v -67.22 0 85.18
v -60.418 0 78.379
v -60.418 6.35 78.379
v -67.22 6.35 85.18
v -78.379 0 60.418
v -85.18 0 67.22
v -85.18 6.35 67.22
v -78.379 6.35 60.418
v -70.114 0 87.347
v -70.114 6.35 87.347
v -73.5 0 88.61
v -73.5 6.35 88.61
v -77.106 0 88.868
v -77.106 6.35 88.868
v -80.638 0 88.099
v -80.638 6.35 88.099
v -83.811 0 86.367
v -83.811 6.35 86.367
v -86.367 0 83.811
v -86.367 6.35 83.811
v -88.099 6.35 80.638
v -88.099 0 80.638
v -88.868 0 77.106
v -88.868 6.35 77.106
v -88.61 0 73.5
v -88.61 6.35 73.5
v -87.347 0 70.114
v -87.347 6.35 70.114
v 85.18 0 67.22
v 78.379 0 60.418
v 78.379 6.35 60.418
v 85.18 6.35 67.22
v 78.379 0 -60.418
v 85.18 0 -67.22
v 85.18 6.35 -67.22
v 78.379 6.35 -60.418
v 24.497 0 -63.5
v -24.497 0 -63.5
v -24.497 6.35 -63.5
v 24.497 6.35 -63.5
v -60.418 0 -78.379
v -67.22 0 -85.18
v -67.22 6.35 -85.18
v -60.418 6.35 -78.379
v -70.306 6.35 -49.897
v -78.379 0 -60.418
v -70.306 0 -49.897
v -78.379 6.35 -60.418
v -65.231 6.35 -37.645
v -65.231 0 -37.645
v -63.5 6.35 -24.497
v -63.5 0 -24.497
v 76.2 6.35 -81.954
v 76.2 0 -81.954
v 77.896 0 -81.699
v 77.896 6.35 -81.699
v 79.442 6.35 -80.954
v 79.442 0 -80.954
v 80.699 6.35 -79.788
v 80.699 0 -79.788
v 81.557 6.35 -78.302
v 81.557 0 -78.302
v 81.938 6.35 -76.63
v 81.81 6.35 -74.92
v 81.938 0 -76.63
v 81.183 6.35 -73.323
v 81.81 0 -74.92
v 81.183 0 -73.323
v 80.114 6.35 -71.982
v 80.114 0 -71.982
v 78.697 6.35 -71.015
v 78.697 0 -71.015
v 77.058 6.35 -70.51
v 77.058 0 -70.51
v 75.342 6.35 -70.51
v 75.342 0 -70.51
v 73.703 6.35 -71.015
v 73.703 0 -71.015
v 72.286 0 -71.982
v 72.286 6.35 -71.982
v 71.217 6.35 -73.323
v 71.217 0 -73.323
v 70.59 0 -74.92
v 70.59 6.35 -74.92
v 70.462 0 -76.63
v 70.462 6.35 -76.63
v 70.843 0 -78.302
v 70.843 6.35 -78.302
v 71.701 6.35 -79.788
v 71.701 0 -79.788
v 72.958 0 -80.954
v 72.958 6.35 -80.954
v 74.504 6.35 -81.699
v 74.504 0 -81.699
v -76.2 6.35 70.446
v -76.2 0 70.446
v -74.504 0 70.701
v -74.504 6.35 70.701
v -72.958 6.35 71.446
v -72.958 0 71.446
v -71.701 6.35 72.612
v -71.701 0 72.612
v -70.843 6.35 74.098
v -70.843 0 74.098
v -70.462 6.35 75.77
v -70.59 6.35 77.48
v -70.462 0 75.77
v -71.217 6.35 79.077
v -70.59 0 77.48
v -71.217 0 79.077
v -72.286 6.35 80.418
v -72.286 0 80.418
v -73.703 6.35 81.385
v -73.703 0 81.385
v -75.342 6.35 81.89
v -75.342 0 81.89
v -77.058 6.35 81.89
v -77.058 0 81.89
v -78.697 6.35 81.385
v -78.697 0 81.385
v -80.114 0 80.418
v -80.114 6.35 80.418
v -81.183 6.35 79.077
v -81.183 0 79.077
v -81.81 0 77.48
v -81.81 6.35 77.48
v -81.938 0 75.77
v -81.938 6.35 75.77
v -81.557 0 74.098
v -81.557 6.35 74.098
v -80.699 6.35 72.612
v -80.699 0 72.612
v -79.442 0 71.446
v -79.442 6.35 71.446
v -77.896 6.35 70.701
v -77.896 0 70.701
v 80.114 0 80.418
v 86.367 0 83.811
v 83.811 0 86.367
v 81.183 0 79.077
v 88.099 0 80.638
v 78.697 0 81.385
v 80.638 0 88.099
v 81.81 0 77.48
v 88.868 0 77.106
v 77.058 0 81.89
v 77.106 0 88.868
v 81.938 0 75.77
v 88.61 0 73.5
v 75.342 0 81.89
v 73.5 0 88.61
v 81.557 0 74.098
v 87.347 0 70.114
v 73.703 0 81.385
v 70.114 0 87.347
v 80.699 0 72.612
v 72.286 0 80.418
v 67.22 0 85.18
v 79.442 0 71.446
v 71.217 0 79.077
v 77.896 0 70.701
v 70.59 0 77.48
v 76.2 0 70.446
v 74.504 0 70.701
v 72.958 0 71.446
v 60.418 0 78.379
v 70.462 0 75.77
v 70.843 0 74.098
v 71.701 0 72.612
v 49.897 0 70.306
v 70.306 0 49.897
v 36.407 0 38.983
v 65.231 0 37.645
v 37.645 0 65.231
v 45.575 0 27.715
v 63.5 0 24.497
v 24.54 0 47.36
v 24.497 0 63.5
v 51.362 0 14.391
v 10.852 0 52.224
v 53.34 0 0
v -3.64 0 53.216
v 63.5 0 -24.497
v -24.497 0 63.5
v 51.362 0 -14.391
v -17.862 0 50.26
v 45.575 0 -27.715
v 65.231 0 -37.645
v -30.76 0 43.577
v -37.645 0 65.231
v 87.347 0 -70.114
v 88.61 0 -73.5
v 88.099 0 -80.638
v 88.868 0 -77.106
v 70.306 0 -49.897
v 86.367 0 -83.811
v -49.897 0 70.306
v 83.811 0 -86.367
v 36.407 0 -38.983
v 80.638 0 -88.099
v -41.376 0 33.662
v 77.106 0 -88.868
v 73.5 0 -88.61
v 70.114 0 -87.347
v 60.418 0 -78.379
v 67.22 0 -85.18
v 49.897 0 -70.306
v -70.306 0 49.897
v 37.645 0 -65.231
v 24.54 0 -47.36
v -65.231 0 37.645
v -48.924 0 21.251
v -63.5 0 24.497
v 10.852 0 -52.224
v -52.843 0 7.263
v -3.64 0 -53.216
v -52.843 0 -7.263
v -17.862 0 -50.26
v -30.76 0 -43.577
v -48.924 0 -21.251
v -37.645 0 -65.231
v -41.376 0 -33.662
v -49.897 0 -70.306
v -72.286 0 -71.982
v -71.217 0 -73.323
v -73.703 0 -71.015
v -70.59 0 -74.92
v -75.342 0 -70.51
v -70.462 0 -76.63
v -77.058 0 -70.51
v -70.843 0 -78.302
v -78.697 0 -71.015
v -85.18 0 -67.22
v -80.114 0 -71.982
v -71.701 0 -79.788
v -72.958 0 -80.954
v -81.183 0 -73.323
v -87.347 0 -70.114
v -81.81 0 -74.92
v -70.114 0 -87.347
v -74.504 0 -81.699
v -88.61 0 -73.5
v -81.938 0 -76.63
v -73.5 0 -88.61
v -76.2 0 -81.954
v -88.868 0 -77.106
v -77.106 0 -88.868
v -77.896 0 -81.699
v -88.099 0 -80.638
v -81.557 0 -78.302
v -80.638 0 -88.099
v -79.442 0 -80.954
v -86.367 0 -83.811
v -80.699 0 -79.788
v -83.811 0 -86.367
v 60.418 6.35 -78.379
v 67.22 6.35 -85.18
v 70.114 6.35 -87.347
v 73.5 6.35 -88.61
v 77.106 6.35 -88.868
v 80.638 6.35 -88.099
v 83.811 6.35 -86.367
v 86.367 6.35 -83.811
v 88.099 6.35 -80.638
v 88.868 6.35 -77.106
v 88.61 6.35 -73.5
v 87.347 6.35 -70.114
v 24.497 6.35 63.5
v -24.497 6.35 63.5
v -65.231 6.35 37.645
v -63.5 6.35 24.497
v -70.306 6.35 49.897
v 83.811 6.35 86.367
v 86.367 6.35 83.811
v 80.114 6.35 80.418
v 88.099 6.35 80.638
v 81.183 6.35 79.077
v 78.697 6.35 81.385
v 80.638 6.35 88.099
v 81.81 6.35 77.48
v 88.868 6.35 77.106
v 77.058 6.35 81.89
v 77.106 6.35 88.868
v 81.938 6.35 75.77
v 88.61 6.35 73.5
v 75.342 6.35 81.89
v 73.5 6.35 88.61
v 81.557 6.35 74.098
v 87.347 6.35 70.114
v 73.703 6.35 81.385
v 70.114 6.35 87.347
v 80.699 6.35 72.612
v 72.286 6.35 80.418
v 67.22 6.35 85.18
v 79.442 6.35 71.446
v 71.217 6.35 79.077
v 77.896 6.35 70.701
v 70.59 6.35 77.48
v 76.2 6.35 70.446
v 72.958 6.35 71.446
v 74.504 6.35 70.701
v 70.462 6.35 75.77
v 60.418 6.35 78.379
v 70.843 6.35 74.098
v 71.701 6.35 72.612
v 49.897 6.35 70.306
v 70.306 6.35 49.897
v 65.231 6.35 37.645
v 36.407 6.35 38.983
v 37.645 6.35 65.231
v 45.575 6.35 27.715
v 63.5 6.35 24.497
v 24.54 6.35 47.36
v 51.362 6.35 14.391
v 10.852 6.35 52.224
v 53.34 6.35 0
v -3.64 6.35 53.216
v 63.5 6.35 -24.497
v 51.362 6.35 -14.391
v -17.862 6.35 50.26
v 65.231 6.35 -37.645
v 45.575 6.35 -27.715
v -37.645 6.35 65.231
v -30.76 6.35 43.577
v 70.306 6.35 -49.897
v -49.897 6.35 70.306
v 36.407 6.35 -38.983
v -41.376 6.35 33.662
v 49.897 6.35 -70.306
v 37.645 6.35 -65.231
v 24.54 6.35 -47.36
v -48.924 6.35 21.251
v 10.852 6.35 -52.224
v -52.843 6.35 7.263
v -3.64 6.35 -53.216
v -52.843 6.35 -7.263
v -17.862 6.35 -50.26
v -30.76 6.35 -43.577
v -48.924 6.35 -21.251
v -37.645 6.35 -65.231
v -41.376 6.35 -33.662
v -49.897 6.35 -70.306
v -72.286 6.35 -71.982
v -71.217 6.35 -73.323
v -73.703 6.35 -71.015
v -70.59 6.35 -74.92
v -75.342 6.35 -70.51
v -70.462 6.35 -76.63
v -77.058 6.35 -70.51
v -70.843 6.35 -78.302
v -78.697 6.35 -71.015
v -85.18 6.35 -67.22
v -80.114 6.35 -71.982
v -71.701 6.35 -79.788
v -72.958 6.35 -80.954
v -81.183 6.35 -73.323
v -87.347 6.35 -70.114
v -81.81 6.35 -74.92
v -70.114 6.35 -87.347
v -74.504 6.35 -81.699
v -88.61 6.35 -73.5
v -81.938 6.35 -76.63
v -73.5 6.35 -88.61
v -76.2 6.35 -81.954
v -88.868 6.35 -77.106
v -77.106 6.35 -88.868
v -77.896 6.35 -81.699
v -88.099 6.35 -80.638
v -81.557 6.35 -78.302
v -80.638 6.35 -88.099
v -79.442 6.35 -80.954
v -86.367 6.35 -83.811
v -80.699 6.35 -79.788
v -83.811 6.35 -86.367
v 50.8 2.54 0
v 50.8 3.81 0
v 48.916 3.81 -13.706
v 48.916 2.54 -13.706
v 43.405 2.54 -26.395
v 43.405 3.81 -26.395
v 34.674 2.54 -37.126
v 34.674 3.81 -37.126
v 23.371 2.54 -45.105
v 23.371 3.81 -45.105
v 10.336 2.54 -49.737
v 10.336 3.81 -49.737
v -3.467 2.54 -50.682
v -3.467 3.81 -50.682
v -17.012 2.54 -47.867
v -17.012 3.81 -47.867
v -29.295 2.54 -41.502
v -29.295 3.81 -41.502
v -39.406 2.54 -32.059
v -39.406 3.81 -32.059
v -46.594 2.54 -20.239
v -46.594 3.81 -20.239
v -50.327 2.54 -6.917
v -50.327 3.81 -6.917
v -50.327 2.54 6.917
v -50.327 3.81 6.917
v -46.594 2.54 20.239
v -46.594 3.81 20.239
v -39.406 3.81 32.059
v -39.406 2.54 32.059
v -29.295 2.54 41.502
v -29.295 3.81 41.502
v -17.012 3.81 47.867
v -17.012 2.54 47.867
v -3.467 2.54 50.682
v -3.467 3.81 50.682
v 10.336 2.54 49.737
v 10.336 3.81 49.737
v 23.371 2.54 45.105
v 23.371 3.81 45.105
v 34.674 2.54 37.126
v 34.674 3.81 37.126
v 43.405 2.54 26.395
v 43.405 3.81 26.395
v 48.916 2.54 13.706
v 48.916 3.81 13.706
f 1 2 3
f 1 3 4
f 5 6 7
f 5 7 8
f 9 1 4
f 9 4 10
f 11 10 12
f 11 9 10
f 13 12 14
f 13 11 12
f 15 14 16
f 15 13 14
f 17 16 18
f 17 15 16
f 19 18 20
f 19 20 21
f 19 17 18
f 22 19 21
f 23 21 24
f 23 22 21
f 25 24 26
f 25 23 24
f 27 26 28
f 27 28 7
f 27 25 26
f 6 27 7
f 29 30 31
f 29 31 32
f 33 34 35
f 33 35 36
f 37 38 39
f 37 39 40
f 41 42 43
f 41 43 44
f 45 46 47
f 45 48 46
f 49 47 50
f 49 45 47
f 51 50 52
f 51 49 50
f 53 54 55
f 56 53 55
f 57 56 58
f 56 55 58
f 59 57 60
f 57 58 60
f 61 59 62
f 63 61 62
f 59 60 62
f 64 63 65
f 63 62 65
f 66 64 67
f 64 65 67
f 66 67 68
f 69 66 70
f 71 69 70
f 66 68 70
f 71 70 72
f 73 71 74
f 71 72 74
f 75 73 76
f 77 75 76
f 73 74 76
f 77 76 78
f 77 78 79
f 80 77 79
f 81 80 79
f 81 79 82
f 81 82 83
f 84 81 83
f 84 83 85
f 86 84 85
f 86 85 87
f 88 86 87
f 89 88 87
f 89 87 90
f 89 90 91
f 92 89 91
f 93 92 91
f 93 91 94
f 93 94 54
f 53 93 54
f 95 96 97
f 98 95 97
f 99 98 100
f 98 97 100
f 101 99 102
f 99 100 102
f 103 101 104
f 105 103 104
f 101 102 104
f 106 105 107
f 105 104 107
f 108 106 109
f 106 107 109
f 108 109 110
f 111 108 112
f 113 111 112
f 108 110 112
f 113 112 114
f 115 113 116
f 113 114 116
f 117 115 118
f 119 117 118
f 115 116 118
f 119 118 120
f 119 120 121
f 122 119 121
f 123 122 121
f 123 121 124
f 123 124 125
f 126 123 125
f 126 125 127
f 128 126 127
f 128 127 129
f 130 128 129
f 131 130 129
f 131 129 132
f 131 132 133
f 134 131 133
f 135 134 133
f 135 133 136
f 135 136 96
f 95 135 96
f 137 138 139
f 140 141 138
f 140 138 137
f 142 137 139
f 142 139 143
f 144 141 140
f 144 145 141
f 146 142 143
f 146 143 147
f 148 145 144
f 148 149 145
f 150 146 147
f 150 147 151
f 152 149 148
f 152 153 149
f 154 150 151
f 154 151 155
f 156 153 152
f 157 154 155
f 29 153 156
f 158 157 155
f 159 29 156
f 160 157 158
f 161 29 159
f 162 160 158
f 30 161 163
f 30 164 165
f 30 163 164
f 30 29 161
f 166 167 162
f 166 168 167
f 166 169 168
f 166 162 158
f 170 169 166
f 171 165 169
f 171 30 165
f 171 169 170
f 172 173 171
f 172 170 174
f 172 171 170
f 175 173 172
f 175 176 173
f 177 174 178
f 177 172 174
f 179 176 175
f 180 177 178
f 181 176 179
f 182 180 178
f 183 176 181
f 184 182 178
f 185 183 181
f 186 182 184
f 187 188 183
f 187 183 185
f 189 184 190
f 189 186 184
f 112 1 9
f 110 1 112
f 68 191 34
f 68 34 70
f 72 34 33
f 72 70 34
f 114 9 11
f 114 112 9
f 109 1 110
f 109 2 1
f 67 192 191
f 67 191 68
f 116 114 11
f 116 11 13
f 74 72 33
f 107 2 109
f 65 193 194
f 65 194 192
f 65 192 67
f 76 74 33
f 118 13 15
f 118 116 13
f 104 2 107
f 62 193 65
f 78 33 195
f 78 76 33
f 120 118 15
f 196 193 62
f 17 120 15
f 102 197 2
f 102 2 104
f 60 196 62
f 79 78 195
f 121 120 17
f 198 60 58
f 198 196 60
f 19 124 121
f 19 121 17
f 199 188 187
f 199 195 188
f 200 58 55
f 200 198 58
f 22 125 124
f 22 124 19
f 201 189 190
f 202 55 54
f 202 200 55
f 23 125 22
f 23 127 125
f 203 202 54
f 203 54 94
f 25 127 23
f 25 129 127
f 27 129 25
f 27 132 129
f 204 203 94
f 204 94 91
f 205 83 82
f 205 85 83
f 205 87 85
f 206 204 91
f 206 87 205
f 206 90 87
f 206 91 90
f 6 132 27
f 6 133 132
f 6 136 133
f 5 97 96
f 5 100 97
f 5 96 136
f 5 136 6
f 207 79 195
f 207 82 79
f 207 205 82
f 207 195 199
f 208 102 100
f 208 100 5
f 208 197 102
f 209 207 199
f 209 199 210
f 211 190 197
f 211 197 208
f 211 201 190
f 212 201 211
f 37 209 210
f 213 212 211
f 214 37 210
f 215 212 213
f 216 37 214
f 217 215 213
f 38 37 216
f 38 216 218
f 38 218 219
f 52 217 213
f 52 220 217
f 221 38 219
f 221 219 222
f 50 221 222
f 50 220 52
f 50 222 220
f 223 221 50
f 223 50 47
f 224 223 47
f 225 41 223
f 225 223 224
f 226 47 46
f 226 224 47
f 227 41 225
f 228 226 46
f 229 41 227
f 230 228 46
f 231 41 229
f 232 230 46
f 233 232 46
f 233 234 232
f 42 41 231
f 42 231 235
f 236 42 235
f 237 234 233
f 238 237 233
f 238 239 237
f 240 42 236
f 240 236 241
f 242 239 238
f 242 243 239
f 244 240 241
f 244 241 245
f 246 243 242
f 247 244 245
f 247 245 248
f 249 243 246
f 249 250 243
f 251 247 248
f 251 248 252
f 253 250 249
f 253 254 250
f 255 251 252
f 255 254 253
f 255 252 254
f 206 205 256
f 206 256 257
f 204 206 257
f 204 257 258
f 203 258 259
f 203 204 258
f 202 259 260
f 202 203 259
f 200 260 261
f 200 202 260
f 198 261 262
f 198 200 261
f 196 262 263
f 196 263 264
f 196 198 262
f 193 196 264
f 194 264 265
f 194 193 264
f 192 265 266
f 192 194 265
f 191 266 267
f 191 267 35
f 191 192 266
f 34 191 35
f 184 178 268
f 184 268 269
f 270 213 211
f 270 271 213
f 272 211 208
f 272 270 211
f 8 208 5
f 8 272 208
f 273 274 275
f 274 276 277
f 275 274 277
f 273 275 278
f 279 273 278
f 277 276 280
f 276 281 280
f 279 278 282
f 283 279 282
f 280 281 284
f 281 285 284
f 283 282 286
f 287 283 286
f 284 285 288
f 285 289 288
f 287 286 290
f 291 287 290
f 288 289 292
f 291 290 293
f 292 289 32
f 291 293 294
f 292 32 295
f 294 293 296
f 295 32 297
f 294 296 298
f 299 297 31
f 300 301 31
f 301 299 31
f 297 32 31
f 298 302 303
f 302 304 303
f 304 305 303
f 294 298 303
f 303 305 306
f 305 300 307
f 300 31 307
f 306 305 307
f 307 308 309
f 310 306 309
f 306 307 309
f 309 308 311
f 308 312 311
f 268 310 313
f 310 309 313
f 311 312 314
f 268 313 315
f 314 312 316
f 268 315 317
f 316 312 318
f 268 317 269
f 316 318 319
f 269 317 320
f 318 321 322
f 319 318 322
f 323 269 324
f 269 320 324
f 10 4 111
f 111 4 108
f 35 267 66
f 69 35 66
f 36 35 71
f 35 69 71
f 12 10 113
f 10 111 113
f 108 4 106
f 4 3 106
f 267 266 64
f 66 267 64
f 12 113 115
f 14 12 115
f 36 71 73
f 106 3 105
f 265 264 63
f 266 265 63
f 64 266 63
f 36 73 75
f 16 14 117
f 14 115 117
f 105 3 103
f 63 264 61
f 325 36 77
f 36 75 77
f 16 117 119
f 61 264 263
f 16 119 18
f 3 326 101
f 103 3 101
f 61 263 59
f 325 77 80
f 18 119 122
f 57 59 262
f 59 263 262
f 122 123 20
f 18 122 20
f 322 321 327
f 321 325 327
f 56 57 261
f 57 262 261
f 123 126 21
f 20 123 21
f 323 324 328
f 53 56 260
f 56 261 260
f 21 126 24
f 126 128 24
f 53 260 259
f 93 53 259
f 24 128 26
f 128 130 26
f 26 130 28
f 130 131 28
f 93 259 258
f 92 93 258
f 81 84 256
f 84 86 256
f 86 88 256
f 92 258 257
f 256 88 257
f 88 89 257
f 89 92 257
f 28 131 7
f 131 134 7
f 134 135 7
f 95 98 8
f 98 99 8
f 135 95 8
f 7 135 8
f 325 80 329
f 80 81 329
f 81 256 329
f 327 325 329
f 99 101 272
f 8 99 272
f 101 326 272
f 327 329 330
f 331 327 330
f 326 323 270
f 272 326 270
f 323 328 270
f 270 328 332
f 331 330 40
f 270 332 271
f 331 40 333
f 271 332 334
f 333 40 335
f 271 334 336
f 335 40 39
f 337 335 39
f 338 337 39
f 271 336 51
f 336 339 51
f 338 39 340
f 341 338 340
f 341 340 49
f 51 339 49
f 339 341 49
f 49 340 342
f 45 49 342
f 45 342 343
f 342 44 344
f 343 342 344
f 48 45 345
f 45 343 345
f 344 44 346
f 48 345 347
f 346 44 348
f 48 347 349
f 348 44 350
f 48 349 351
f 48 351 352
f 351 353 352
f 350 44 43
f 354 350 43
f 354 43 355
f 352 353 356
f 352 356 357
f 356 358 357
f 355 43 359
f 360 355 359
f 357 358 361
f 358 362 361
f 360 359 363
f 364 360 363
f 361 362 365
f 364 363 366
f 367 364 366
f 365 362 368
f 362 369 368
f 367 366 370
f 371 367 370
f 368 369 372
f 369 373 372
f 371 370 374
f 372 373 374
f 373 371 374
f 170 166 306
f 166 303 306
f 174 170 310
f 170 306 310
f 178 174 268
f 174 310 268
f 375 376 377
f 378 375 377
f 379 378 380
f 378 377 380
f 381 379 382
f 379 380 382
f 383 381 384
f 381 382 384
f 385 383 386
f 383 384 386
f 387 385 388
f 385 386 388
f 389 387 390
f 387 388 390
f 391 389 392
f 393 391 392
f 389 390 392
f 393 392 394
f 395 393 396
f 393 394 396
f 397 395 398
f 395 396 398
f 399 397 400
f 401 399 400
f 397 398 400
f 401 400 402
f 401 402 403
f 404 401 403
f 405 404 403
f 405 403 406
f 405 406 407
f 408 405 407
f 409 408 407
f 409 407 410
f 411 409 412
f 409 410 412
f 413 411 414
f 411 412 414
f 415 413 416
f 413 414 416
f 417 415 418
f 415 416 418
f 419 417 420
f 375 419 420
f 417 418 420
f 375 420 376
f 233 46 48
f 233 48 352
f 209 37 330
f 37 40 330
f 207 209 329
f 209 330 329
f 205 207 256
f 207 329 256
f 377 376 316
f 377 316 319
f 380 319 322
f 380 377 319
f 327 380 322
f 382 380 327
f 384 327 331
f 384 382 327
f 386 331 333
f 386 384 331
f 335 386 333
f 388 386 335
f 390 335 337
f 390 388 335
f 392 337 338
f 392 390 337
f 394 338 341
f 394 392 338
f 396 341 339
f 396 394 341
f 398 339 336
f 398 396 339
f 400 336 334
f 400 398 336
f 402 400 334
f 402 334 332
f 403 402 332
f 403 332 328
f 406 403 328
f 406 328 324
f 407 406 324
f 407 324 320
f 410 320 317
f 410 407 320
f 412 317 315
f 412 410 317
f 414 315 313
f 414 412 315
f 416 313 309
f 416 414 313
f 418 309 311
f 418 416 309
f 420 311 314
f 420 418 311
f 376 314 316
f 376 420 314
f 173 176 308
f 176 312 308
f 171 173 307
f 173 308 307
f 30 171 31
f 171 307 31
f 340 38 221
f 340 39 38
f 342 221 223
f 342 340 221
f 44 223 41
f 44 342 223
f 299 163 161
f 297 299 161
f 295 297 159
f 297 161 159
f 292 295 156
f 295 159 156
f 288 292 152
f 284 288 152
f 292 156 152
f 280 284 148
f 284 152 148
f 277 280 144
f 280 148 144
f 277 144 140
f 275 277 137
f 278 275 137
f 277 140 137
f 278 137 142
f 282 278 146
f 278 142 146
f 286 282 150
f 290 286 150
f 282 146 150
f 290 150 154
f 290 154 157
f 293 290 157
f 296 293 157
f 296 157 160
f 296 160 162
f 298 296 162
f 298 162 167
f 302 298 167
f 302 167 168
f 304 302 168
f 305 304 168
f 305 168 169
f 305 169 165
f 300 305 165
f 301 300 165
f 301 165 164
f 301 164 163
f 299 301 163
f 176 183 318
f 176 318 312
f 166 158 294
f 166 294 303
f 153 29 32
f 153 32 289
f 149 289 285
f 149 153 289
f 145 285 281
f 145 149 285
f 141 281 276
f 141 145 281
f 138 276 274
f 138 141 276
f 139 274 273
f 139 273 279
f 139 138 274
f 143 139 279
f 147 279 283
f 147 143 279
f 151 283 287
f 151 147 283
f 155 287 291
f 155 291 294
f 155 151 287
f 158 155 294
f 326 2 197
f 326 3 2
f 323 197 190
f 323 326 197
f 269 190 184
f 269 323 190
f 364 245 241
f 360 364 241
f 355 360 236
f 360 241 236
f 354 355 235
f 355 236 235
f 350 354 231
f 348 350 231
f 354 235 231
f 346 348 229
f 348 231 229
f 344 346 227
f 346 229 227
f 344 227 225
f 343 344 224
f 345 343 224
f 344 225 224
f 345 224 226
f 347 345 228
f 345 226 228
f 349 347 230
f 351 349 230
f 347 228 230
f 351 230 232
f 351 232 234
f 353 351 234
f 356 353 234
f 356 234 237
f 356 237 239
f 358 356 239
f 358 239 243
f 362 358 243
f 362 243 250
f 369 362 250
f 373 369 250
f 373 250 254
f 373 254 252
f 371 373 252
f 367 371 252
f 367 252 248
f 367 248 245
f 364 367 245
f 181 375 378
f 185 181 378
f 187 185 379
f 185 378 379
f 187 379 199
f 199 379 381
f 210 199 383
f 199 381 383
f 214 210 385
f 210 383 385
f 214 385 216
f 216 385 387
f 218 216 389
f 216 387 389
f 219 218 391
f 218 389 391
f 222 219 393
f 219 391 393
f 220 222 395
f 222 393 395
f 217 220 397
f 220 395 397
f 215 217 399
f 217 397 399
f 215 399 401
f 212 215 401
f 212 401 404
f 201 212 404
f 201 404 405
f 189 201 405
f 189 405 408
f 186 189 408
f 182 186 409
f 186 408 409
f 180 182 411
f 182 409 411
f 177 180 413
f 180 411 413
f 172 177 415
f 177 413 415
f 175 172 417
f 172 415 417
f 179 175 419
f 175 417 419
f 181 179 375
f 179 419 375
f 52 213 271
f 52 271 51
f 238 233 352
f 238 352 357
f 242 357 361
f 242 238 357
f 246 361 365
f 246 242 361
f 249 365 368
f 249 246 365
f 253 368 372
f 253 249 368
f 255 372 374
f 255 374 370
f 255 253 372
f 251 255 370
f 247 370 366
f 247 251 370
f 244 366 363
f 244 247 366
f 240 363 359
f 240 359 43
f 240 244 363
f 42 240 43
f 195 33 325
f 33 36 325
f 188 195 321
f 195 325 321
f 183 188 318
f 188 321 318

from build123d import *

# Parameters (mm, degrees)
BOSS_EXTRUDE1_DEPTH         = 6.35
SKETCH2_R                   = 50.8
CUT_EXTRUDE1_DEPTH          = 6.35
FILLET1_R                   = 50.8
F_1_2_20_TAPPED_HOLE1_D     = 11.50874
F_1_2_20_TAPPED_HOLE1_DEPTH = 29.21
F_1_2_20_TAPPED_HOLE1_TIP   = 3.45757432
CHAMFER1_SIZE               = 2.54


with BuildPart() as part:
    # Sketch1 → Boss-Extrude1 (new body)
    with BuildSketch(Plane(origin=(0, 0, 0), x_dir=(1, 0, 0), z_dir=(0, 1, 0))):
        with BuildLine():
            Line((-45.539487758, 63.5), (45.539487758, 63.5))
            Line((45.539487758, 63.5), (67.219743879, 85.180256121))
            ThreePointArc((67.219743879, 85.180256121), (85.180256121, 85.180256121), (85.180256121, 67.219743879))
            Line((85.180256121, 67.219743879), (63.5, 45.539487758))
            Line((63.5, 45.539487758), (63.5, -45.539487758))
            Line((63.5, -45.539487758), (85.180256121, -67.219743879))
            ThreePointArc((85.180256121, -67.219743879), (85.180256121, -85.180256121), (67.219743879, -85.180256121))
            Line((67.219743879, -85.180256121), (45.539487758, -63.5))
            Line((45.539487758, -63.5), (-45.539487758, -63.5))
            Line((-45.539487758, -63.5), (-67.219743879, -85.180256121))
            ThreePointArc((-67.219743879, -85.180256121), (-85.180256121, -85.180256121), (-85.180256121, -67.219743879))
            Line((-85.180256121, -67.219743879), (-63.5, -45.539487758))
            Line((-63.5, -45.539487758), (-63.5, 45.539487758))
            Line((-63.5, 45.539487758), (-85.180256121, 67.219743879))
            ThreePointArc((-85.180256121, 67.219743879), (-85.180256121, 85.180256121), (-67.219743879, 85.180256121))
            Line((-67.219743879, 85.180256121), (-45.539487758, 63.5))
        make_face()
    extrude(amount=BOSS_EXTRUDE1_DEPTH)

    # Sketch2 → Cut-Extrude1 (cut)
    with BuildSketch(Plane(origin=(0, 6.35, 0), x_dir=(1, 0, 0), z_dir=(0, 1, 0))):
        Circle(SKETCH2_R)
    extrude(amount=-CUT_EXTRUDE1_DEPTH, mode=Mode.SUBTRACT)

    # Fillet1
    fillet1_edges = [part.edges().sort_by_distance(p)[0] for p in [
        (-63.5, 3.175, 45.539487758),
        (-63.5, 3.175, -45.539487758),
        (-45.539487758, 3.175, -63.5),
        (45.539487758, 3.175, -63.5),
        (63.5, 3.175, -45.539487758),
        (63.5, 3.175, 45.539487758),
        (45.539487758, 3.175, 63.5),
        (-45.539487758, 3.175, 63.5),
    ]]
    fillet(fillet1_edges, radius=FILLET1_R)

    # 1/2-20 Tapped Hole1
    with Locations(Plane(origin=(-76.2, 6.35, -76.2), x_dir=(0, 0, 1), z_dir=(0, 1, 0))):
        with Locations((0, 0), (0, 152.4), (152.4, 152.4), (152.4, 0)):
            Hole(F_1_2_20_TAPPED_HOLE1_D / 2, depth=F_1_2_20_TAPPED_HOLE1_DEPTH)
            with Locations((0, 0, -(F_1_2_20_TAPPED_HOLE1_DEPTH + F_1_2_20_TAPPED_HOLE1_TIP / 2))):  # 118° drill point
                Cone(0, F_1_2_20_TAPPED_HOLE1_D / 2, F_1_2_20_TAPPED_HOLE1_TIP, mode=Mode.SUBTRACT)

    # Chamfer1
    chamfer1_edges = [part.edges().sort_by_distance(p)[0] for p in [
        (-50.8, 0, 0),
        (-50.8, 6.35, 0),
    ]]
    chamfer(chamfer1_edges, length=CHAMFER1_SIZE)


solid = part.part
